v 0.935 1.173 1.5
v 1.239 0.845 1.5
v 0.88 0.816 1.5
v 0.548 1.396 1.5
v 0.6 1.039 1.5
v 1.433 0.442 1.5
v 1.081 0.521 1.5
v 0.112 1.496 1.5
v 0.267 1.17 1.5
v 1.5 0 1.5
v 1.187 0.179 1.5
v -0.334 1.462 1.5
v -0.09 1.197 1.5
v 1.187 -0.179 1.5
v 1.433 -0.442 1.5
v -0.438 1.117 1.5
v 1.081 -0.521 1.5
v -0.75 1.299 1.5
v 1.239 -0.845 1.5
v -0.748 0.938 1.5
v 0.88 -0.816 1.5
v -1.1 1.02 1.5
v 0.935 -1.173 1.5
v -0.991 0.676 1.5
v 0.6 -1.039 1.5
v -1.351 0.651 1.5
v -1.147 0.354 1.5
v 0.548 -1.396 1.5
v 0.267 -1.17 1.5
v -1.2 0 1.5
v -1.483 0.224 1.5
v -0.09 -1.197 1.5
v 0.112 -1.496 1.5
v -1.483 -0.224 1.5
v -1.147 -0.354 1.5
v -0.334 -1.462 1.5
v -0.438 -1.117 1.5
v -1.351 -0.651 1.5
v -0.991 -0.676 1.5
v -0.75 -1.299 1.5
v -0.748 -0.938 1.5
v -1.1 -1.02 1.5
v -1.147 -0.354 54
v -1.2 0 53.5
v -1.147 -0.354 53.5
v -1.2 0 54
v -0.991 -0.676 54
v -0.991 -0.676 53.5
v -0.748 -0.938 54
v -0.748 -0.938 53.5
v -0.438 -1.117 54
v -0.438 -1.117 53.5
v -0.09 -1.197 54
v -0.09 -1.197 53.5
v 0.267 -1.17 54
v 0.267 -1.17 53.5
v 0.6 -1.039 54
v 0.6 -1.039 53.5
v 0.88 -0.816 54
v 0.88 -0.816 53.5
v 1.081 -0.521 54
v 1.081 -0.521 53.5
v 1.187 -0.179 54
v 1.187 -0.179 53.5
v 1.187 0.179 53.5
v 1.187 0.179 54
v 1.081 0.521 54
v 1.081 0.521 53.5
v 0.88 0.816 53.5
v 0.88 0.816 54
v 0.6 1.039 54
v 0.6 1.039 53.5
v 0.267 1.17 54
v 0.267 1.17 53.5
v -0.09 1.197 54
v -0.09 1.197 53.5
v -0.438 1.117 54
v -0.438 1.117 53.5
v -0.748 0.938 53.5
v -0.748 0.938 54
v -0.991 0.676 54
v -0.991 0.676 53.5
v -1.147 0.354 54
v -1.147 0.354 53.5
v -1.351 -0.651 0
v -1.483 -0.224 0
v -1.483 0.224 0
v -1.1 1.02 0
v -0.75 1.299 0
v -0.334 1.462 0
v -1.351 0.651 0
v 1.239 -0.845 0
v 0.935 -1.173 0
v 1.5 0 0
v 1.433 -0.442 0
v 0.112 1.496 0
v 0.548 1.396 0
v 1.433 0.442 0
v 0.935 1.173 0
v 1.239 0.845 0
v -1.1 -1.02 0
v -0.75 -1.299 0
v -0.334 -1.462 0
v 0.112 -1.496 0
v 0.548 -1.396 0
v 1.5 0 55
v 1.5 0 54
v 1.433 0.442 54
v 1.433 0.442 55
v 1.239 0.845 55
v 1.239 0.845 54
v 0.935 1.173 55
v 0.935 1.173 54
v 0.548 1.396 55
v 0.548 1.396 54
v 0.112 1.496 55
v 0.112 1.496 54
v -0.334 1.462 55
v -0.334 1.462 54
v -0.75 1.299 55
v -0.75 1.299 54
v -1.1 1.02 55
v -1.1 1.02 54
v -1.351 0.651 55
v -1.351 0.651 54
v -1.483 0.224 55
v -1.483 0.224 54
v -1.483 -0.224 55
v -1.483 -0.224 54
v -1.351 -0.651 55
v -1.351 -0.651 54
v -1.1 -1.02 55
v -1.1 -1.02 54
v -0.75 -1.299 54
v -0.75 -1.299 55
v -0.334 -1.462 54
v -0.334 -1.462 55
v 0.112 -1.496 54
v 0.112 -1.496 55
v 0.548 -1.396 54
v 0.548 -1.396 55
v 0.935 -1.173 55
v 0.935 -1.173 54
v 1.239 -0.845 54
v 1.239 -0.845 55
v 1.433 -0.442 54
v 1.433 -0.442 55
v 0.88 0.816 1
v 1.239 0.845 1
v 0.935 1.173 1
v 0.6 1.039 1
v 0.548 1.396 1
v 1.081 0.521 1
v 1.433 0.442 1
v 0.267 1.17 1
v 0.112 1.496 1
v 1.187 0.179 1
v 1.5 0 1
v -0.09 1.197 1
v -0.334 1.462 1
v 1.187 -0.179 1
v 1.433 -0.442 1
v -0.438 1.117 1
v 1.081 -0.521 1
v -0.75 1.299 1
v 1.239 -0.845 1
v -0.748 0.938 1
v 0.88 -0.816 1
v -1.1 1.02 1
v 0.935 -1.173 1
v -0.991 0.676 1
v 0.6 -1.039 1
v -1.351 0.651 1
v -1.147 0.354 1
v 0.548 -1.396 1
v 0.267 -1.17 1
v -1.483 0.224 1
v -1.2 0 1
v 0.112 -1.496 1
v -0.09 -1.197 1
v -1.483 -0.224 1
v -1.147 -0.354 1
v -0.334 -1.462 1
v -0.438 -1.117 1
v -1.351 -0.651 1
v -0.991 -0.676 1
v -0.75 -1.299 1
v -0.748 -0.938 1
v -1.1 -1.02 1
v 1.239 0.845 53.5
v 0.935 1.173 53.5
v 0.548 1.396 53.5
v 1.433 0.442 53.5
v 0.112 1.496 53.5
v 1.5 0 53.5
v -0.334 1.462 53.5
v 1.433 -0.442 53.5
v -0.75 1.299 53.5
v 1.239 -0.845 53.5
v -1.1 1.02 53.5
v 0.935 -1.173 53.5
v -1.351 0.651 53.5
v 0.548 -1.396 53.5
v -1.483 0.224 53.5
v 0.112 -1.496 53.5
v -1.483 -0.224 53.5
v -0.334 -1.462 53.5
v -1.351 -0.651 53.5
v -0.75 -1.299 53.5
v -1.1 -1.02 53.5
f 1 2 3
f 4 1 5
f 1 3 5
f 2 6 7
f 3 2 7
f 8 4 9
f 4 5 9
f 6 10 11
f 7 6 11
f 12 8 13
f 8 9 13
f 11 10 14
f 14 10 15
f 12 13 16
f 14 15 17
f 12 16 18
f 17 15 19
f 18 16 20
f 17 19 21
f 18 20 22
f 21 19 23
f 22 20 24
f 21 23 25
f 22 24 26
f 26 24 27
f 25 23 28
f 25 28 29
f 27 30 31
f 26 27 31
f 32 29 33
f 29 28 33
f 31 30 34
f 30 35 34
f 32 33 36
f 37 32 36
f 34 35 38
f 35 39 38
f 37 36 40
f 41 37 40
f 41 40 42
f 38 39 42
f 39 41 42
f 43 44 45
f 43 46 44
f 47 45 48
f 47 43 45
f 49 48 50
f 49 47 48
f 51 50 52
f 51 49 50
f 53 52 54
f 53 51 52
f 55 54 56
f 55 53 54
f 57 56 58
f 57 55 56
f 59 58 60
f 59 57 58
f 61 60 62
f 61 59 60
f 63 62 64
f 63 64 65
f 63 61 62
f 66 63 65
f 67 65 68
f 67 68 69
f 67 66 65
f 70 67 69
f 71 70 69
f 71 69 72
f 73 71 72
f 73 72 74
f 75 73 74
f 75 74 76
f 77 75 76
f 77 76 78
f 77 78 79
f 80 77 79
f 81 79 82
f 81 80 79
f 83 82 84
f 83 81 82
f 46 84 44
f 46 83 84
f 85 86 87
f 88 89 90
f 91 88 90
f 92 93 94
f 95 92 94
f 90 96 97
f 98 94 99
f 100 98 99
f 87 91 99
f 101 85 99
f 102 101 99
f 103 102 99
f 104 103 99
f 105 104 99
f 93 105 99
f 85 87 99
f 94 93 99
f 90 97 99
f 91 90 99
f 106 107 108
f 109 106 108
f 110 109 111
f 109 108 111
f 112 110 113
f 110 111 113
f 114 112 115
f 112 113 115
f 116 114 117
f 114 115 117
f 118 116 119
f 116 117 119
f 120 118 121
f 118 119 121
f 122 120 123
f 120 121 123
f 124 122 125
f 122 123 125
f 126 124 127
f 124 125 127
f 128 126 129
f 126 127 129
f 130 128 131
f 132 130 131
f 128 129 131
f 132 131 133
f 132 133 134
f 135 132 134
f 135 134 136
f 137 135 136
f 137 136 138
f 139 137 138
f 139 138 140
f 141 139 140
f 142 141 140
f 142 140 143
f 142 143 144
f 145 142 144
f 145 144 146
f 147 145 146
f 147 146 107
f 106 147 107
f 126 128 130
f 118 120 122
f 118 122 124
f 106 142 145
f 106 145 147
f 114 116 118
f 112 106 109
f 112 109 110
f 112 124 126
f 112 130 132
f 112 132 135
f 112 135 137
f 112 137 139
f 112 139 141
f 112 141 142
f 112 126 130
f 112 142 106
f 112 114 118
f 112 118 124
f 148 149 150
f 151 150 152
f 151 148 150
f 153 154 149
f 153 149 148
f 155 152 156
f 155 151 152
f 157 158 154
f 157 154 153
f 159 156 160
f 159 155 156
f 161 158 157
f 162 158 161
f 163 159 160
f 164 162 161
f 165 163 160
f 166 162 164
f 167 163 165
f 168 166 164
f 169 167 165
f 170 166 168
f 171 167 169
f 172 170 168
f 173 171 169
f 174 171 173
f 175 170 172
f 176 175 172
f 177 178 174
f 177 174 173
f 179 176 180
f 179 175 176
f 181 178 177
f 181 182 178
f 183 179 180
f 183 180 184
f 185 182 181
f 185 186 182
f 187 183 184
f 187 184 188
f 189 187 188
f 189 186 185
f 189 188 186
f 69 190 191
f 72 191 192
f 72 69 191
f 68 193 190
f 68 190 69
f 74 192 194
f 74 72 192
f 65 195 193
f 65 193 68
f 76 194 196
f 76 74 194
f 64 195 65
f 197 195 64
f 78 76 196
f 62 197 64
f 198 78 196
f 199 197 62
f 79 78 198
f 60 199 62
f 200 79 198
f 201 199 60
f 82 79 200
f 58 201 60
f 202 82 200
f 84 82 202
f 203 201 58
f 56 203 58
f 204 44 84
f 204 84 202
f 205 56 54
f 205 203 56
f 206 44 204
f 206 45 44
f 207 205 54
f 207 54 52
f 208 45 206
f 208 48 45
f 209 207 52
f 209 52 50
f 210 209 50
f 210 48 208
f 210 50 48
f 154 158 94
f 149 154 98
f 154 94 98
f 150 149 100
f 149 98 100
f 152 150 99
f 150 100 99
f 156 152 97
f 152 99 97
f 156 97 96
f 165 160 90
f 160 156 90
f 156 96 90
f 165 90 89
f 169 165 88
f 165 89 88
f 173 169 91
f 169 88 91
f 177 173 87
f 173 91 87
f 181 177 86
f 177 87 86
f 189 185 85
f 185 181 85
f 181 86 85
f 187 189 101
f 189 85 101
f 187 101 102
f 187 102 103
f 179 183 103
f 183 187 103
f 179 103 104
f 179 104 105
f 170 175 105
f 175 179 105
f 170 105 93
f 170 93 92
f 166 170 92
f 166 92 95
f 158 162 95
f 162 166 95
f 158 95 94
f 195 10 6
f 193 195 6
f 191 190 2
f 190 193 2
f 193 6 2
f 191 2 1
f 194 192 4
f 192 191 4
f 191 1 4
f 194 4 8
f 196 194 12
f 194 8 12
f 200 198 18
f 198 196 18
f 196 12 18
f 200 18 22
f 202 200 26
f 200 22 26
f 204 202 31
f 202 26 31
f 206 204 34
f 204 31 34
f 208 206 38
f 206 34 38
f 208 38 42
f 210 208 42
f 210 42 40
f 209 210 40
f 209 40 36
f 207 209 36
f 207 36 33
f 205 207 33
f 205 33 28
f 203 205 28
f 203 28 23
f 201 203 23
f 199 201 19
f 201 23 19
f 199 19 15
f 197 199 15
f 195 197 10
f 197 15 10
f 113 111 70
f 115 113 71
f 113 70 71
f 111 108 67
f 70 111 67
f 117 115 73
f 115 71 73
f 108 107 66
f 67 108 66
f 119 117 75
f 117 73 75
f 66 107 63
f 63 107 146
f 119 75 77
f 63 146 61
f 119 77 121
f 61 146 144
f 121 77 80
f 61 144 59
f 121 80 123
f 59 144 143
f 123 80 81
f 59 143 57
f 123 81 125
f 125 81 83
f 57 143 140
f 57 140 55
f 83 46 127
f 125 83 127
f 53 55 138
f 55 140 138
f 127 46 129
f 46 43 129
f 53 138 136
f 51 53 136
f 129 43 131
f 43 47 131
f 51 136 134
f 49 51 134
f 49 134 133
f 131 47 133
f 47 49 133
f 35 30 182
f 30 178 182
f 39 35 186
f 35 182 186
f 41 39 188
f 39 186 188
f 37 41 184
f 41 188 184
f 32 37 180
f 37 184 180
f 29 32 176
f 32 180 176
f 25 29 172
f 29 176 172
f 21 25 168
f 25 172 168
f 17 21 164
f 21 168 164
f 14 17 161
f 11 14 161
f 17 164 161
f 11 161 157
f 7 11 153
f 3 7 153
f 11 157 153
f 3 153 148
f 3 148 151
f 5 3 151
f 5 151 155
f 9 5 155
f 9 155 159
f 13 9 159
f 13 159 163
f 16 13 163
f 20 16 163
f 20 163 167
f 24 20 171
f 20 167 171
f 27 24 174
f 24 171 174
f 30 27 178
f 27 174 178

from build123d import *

# Parameters (mm, degrees)
SKETCH1_R           = 1.5
BOSS_EXTRUDE1_DEPTH = 55
SKETCH2_W           = 3.168024794
SKETCH2_H           = 0.5


with BuildPart() as part:
    # Sketch1 → Boss-Extrude1 (new body)
    with BuildSketch(Plane.XY):
        Circle(SKETCH1_R)
    extrude(amount=BOSS_EXTRUDE1_DEPTH)

    # Sketch2 → Cut-Revolve1 (revolve, cut)
    with BuildSketch(Plane(origin=(0, 0, 0), x_dir=(1, 0, 0), z_dir=(0, 1, 0))):
        with Locations((-2.784012397, -1.25)):
            Rectangle(SKETCH2_W, SKETCH2_H)
    cut_revolve1 = revolve(axis=Axis((0, 0, 0), (0, 0, 1)), mode=Mode.SUBTRACT)

    # Mirror1: Cut-Revolve1 across plane
    add(cut_revolve1.mirror(Plane.XY.offset(27.5)), mode=Mode.SUBTRACT)


solid = part.part
